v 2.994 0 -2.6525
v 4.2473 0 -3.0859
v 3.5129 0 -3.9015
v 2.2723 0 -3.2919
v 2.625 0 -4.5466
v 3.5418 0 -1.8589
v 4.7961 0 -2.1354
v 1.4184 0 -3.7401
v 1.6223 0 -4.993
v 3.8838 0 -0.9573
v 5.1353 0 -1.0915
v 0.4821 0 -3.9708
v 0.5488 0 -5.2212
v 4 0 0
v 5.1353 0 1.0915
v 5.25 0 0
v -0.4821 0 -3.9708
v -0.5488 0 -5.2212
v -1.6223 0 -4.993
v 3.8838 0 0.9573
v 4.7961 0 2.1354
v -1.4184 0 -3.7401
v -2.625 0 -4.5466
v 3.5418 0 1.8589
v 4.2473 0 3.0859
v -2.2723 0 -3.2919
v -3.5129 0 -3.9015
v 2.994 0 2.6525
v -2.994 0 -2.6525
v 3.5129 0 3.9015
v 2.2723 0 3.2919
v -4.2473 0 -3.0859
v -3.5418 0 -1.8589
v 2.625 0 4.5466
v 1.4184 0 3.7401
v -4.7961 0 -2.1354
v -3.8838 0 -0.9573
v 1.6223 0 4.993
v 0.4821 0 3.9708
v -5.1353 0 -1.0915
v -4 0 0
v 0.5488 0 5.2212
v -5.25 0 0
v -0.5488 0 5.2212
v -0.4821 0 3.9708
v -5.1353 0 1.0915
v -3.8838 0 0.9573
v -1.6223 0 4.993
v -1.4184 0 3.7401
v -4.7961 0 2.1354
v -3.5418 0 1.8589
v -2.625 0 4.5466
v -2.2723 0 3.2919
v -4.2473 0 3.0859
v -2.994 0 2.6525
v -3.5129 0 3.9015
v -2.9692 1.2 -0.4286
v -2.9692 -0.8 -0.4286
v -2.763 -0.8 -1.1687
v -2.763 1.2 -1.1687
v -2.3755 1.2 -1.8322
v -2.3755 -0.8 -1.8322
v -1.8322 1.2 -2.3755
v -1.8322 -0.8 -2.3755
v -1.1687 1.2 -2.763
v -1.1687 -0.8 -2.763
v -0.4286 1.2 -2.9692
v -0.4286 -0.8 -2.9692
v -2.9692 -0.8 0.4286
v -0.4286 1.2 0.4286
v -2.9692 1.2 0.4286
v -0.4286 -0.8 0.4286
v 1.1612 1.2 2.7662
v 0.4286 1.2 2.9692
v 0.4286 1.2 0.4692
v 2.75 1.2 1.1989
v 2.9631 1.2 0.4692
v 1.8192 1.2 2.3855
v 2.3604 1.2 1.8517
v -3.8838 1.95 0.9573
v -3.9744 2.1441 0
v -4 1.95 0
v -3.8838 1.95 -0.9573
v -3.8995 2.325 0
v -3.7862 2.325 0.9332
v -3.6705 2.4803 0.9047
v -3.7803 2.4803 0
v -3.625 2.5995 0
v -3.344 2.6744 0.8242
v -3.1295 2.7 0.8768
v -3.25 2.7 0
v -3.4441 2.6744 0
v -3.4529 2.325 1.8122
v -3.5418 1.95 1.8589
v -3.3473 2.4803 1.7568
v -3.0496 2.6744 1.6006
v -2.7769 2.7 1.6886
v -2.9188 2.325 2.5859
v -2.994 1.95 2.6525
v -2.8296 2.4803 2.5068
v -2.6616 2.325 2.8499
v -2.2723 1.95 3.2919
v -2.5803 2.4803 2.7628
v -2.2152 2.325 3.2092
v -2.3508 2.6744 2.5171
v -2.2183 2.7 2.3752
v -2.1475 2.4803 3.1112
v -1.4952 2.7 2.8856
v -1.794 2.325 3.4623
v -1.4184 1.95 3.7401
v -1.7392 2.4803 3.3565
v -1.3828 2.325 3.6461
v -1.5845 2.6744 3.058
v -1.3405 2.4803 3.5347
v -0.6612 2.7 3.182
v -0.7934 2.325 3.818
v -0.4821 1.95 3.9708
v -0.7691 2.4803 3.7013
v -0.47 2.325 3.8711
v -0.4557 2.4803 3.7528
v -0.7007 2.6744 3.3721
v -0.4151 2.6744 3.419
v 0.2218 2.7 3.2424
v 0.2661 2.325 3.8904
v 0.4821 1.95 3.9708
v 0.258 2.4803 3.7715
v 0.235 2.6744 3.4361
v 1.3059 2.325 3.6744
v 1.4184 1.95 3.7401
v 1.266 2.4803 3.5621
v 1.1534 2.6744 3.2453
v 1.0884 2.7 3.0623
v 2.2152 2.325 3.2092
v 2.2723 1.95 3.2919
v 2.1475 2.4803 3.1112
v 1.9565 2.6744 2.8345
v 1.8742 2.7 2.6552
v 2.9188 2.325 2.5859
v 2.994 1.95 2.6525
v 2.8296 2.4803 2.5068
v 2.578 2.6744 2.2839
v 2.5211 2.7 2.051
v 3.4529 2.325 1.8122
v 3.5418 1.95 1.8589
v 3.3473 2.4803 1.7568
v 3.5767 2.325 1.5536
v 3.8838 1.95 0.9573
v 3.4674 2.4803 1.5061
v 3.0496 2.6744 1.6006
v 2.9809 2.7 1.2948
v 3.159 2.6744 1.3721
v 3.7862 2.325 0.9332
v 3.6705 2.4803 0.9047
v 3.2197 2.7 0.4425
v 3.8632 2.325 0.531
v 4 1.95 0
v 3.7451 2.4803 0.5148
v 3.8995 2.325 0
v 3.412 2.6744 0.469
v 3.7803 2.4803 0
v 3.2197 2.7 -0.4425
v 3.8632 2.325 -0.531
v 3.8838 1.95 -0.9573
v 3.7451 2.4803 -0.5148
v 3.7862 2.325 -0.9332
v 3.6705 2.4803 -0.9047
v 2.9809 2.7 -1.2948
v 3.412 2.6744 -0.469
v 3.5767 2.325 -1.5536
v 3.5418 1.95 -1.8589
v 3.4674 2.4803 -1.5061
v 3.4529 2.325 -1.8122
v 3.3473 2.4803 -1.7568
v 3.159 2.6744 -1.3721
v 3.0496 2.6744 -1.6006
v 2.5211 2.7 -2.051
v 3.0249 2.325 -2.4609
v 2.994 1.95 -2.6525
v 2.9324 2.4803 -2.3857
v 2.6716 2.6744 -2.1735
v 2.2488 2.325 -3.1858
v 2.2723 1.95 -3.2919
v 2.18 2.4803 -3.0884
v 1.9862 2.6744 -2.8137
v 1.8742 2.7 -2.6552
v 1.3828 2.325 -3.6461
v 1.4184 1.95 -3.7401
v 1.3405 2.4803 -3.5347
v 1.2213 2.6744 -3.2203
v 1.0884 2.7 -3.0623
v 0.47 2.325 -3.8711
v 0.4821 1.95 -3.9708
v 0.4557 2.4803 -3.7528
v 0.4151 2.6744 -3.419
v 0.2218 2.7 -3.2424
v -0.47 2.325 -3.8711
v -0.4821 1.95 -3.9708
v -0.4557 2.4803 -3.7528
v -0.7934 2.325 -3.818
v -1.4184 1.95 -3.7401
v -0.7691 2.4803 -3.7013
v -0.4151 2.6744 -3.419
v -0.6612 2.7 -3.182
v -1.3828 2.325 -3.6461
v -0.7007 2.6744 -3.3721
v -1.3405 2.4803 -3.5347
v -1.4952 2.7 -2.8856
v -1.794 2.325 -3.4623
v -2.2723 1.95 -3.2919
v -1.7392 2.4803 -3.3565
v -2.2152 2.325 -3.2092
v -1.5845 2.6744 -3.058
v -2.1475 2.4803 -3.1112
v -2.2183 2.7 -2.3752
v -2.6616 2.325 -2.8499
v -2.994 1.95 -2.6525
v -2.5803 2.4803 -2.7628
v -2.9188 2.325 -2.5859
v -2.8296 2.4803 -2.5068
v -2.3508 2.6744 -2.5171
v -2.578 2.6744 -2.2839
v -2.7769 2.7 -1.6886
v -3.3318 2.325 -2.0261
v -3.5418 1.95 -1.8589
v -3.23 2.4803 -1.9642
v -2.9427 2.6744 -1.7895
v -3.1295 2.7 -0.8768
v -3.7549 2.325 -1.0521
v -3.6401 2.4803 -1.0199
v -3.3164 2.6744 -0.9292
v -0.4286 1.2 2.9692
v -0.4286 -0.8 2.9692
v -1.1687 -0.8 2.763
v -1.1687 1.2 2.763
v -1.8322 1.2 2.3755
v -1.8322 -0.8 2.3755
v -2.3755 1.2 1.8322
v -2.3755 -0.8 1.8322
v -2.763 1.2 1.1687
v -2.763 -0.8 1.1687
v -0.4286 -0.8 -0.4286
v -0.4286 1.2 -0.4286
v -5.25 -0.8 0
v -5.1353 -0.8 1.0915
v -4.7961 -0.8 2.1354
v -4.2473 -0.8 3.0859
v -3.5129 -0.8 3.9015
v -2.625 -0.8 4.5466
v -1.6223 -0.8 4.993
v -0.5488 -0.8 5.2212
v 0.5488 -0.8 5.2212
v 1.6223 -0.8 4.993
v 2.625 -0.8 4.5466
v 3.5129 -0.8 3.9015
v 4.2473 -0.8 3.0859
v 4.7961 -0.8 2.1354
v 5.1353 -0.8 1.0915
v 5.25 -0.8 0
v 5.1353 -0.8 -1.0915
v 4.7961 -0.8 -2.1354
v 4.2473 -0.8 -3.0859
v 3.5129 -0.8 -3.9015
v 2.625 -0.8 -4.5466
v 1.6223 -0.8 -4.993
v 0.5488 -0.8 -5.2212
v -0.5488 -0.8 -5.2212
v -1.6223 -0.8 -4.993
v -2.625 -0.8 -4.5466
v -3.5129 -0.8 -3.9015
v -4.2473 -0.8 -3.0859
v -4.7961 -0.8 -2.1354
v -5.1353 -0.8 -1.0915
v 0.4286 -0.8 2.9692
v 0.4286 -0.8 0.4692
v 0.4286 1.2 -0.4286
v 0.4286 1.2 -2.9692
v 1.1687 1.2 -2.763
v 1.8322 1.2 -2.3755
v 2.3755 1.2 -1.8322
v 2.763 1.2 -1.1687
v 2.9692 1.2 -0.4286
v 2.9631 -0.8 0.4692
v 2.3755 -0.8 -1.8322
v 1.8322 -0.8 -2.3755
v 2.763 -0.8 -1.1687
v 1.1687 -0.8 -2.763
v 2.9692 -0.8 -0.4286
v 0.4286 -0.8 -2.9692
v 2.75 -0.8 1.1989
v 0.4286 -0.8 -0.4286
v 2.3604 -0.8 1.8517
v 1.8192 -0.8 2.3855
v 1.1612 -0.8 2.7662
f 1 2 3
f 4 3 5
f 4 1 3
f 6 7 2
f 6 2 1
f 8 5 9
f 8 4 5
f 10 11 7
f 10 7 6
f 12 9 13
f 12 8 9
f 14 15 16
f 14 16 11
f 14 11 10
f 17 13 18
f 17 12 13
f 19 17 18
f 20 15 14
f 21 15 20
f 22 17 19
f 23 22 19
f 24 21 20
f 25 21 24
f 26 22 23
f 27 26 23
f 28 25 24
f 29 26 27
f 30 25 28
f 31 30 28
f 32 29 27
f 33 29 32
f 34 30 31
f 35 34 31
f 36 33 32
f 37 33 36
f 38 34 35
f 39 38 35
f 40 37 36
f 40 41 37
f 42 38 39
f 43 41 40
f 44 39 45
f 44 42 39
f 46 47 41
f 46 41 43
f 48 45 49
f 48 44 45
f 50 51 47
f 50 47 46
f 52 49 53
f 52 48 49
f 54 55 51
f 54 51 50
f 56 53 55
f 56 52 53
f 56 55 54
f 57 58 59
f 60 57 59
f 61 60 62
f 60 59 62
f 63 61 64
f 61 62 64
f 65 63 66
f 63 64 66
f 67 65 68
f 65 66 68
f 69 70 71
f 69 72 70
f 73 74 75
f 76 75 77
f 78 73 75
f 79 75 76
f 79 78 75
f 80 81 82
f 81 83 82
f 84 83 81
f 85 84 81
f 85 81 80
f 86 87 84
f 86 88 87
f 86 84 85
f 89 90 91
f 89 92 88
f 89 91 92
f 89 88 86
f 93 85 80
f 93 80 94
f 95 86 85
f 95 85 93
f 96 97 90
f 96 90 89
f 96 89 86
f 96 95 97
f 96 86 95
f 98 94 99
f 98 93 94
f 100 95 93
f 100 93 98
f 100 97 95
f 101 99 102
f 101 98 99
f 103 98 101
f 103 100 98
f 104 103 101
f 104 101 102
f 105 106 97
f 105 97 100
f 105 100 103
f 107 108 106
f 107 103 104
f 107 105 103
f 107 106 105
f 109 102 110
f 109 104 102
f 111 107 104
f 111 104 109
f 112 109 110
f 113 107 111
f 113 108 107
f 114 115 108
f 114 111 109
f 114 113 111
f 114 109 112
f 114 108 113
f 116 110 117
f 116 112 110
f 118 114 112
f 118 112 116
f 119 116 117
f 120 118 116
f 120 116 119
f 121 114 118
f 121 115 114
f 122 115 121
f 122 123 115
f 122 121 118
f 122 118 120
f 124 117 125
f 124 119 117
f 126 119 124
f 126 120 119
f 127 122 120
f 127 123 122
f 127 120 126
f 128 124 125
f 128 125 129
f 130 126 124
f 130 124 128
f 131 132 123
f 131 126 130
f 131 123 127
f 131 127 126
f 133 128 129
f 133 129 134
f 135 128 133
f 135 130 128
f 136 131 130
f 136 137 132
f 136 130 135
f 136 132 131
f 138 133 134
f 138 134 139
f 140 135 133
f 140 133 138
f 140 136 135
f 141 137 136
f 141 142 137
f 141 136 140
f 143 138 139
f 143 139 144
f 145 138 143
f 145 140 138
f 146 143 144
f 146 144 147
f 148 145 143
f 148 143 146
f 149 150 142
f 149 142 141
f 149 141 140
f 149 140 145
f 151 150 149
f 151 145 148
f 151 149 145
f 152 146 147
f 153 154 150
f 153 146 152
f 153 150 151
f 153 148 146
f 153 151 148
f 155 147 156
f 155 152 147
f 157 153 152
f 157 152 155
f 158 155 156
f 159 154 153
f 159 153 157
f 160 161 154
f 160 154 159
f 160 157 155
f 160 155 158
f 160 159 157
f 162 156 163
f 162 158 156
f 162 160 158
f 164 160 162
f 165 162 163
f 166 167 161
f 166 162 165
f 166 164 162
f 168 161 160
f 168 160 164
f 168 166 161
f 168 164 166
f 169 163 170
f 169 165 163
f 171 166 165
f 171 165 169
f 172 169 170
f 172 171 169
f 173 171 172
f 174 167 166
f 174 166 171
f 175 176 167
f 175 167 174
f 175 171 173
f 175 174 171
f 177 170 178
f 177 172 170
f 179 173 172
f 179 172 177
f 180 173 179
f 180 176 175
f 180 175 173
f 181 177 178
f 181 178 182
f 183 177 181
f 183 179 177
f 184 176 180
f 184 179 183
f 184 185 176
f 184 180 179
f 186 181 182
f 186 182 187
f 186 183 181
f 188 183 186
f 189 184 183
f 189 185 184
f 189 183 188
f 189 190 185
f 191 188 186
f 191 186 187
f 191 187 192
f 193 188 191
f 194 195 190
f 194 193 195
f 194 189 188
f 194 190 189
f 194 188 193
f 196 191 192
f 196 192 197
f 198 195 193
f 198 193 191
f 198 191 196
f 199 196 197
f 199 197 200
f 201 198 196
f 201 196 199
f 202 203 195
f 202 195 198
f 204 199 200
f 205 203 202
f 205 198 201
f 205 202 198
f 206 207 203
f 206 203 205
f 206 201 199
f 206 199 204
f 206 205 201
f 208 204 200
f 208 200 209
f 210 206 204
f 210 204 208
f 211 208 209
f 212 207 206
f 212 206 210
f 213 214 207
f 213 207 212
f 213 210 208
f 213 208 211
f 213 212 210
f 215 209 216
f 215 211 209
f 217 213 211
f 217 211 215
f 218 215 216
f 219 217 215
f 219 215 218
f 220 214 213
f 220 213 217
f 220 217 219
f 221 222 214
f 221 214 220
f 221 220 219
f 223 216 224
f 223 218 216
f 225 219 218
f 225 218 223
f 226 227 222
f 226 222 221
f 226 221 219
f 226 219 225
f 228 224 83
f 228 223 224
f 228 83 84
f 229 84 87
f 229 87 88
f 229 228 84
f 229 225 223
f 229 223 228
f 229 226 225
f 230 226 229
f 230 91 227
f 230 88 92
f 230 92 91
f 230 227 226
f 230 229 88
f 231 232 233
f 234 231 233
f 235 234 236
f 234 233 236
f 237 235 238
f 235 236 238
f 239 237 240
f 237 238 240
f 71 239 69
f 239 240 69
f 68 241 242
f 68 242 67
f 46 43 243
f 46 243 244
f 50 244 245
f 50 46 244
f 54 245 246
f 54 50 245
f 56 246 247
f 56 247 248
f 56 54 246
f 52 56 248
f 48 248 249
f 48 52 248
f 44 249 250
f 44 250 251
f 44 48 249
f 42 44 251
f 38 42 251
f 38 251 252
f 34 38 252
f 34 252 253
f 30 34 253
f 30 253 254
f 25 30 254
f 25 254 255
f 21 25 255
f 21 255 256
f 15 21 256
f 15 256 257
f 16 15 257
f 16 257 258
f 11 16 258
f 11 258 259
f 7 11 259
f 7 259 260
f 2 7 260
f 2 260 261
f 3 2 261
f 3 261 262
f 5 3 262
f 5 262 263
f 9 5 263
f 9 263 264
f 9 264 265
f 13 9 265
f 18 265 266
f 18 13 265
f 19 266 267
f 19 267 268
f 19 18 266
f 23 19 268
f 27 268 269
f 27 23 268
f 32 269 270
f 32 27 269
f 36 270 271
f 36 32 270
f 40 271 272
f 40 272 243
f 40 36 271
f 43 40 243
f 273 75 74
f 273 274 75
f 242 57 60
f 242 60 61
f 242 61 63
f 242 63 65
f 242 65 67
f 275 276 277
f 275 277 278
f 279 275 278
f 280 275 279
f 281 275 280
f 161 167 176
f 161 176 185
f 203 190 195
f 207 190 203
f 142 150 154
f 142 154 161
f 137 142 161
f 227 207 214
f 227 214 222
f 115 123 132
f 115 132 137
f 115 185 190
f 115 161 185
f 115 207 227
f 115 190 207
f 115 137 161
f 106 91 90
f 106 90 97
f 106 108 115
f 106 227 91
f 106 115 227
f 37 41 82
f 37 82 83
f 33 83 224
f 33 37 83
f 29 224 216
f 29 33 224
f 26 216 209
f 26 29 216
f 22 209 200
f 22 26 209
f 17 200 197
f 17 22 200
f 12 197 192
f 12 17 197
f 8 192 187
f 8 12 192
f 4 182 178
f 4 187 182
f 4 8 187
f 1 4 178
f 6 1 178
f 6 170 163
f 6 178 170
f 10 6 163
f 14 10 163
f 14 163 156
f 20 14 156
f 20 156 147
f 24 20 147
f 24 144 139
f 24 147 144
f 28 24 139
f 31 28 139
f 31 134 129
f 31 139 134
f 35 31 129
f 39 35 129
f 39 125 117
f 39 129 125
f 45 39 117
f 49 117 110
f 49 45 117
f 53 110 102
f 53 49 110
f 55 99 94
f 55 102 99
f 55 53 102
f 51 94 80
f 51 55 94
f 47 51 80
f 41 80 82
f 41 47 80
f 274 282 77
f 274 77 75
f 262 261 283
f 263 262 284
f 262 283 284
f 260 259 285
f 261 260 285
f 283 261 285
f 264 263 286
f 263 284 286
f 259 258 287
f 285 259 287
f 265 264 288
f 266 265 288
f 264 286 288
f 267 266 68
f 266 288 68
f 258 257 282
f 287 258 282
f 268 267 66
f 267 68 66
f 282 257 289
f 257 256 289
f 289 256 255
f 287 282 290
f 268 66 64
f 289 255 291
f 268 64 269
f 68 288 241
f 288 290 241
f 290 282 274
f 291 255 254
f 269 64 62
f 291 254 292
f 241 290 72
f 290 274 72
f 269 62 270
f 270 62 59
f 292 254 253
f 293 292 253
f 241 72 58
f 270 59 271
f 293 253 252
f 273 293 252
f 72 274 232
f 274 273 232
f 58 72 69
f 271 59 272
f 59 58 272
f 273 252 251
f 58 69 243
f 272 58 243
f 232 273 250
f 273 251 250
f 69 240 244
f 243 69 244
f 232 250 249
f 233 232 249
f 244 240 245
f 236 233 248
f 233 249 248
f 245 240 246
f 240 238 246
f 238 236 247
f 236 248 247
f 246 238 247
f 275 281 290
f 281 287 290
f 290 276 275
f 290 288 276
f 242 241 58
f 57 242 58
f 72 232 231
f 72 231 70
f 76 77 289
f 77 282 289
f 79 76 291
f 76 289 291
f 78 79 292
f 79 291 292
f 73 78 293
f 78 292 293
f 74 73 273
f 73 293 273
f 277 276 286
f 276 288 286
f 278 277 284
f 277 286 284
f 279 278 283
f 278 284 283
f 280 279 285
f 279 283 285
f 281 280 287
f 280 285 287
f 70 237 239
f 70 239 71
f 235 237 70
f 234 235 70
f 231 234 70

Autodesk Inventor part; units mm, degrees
ref_plane "YZ Plane" through (0, 0, 0) normal (1, 0, 0) x (0, 1, 0)
ref_plane "XZ Plane" through (0, 0, 0) normal (0, 1, 0) x (-1, 0, 0)
ref_plane "XY Plane" through (0, 0, 0) normal (0, 0, 1) x (1, 0, 0)
sketch "Sketch1" plane through (0, 0, 0) normal (0, 1, 0) x (-1, 0, 0)
  circle A0 centre (0, 0) radius 5.25
  circle A1 centre (0, 0) radius 4
  dimension "d0" = 10.5
  dimension "d1" = 8
extrude "Extrusion1" add sketch "Sketch1" against normal blind 0.8 contours A0 | A1
extrude "Extrusion2" add sketch "Sketch1" along normal blind 2.7 contours A1
fillet "Fillet3" radius 0.75 1 edges at (4, 2.7, 0)
sketch "Sketch2" plane through (0, -0.8, 0) normal (0, -1, 0) x (1, 0, 0)
  arc A0 (0.4286, -2.9692) -> (2.9692, -0.4286) centre (0, 0) ccw
  line L0 (0.4286, -2.9692) -> (0.4286, -0.4286)
  arc A1 (-2.9692, -0.4286) -> (-0.4286, -2.9692) centre (0, 0) ccw
  line L1 (-0.4286, 2.9692) -> (-0.4286, 0.4286)
  arc A2 (-0.4286, 2.9692) -> (-2.9692, 0.4286) centre (0, 0) ccw
  arc A3 (2.9631, 0.4692) -> (0.4286, 2.9692) centre (0, 0) ccw
  line L2 (2.9631, 0.4692) -> (0.4286, 0.4692)
  line L3 (2.9692, -0.4286) -> (0.4286, -0.4286)
  line L4 (0.4286, 0.4692) -> (0.4286, 2.9692)
  line L5 (-0.4286, -0.4286) -> (-0.4286, -2.9692)
  line L6 (-0.4286, -0.4286) -> (-2.9692, -0.4286)
  line L7 (-0.4286, 0.4286) -> (-2.9692, 0.4286)
  circle A4 centre (0, 0) radius 3
extrude "Extrusion3" cut sketch "Sketch2" against normal blind 2 contours L0 L3 A0 | A1 L6 L5 | L2 L4 A3 | A2 L1 L7
properties part number "action-button"
